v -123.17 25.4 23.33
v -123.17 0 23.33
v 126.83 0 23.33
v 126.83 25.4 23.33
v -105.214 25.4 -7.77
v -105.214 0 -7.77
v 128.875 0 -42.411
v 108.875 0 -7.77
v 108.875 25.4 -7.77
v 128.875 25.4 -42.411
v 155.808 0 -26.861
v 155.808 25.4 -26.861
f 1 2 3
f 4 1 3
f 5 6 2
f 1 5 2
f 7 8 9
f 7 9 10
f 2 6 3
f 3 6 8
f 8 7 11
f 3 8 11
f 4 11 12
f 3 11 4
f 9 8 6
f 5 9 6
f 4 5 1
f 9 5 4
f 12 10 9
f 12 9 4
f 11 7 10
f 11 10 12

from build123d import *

# Parameters (mm, degrees)
BOSS_EXTRUDE1_DEPTH = 25.4


with BuildPart() as part:
    # Sketch1 → Boss-Extrude1 (new body)
    with BuildSketch(Plane(origin=(0, 0, 0), x_dir=(1, 0, 0), z_dir=(0, 1, 0))):
        Polygon((-123.169565917, -23.329882989), (126.830434083, -23.329882989), (108.874840712, 7.770117011), (-105.213972545, 7.770117011), align=None)
        Polygon((155.808230769, 26.861133162), (126.830434083, -23.329882989), (108.874840712, 7.770117011), (128.874840712, 42.411133162), align=None)
    extrude(amount=BOSS_EXTRUDE1_DEPTH)


solid = part.part
